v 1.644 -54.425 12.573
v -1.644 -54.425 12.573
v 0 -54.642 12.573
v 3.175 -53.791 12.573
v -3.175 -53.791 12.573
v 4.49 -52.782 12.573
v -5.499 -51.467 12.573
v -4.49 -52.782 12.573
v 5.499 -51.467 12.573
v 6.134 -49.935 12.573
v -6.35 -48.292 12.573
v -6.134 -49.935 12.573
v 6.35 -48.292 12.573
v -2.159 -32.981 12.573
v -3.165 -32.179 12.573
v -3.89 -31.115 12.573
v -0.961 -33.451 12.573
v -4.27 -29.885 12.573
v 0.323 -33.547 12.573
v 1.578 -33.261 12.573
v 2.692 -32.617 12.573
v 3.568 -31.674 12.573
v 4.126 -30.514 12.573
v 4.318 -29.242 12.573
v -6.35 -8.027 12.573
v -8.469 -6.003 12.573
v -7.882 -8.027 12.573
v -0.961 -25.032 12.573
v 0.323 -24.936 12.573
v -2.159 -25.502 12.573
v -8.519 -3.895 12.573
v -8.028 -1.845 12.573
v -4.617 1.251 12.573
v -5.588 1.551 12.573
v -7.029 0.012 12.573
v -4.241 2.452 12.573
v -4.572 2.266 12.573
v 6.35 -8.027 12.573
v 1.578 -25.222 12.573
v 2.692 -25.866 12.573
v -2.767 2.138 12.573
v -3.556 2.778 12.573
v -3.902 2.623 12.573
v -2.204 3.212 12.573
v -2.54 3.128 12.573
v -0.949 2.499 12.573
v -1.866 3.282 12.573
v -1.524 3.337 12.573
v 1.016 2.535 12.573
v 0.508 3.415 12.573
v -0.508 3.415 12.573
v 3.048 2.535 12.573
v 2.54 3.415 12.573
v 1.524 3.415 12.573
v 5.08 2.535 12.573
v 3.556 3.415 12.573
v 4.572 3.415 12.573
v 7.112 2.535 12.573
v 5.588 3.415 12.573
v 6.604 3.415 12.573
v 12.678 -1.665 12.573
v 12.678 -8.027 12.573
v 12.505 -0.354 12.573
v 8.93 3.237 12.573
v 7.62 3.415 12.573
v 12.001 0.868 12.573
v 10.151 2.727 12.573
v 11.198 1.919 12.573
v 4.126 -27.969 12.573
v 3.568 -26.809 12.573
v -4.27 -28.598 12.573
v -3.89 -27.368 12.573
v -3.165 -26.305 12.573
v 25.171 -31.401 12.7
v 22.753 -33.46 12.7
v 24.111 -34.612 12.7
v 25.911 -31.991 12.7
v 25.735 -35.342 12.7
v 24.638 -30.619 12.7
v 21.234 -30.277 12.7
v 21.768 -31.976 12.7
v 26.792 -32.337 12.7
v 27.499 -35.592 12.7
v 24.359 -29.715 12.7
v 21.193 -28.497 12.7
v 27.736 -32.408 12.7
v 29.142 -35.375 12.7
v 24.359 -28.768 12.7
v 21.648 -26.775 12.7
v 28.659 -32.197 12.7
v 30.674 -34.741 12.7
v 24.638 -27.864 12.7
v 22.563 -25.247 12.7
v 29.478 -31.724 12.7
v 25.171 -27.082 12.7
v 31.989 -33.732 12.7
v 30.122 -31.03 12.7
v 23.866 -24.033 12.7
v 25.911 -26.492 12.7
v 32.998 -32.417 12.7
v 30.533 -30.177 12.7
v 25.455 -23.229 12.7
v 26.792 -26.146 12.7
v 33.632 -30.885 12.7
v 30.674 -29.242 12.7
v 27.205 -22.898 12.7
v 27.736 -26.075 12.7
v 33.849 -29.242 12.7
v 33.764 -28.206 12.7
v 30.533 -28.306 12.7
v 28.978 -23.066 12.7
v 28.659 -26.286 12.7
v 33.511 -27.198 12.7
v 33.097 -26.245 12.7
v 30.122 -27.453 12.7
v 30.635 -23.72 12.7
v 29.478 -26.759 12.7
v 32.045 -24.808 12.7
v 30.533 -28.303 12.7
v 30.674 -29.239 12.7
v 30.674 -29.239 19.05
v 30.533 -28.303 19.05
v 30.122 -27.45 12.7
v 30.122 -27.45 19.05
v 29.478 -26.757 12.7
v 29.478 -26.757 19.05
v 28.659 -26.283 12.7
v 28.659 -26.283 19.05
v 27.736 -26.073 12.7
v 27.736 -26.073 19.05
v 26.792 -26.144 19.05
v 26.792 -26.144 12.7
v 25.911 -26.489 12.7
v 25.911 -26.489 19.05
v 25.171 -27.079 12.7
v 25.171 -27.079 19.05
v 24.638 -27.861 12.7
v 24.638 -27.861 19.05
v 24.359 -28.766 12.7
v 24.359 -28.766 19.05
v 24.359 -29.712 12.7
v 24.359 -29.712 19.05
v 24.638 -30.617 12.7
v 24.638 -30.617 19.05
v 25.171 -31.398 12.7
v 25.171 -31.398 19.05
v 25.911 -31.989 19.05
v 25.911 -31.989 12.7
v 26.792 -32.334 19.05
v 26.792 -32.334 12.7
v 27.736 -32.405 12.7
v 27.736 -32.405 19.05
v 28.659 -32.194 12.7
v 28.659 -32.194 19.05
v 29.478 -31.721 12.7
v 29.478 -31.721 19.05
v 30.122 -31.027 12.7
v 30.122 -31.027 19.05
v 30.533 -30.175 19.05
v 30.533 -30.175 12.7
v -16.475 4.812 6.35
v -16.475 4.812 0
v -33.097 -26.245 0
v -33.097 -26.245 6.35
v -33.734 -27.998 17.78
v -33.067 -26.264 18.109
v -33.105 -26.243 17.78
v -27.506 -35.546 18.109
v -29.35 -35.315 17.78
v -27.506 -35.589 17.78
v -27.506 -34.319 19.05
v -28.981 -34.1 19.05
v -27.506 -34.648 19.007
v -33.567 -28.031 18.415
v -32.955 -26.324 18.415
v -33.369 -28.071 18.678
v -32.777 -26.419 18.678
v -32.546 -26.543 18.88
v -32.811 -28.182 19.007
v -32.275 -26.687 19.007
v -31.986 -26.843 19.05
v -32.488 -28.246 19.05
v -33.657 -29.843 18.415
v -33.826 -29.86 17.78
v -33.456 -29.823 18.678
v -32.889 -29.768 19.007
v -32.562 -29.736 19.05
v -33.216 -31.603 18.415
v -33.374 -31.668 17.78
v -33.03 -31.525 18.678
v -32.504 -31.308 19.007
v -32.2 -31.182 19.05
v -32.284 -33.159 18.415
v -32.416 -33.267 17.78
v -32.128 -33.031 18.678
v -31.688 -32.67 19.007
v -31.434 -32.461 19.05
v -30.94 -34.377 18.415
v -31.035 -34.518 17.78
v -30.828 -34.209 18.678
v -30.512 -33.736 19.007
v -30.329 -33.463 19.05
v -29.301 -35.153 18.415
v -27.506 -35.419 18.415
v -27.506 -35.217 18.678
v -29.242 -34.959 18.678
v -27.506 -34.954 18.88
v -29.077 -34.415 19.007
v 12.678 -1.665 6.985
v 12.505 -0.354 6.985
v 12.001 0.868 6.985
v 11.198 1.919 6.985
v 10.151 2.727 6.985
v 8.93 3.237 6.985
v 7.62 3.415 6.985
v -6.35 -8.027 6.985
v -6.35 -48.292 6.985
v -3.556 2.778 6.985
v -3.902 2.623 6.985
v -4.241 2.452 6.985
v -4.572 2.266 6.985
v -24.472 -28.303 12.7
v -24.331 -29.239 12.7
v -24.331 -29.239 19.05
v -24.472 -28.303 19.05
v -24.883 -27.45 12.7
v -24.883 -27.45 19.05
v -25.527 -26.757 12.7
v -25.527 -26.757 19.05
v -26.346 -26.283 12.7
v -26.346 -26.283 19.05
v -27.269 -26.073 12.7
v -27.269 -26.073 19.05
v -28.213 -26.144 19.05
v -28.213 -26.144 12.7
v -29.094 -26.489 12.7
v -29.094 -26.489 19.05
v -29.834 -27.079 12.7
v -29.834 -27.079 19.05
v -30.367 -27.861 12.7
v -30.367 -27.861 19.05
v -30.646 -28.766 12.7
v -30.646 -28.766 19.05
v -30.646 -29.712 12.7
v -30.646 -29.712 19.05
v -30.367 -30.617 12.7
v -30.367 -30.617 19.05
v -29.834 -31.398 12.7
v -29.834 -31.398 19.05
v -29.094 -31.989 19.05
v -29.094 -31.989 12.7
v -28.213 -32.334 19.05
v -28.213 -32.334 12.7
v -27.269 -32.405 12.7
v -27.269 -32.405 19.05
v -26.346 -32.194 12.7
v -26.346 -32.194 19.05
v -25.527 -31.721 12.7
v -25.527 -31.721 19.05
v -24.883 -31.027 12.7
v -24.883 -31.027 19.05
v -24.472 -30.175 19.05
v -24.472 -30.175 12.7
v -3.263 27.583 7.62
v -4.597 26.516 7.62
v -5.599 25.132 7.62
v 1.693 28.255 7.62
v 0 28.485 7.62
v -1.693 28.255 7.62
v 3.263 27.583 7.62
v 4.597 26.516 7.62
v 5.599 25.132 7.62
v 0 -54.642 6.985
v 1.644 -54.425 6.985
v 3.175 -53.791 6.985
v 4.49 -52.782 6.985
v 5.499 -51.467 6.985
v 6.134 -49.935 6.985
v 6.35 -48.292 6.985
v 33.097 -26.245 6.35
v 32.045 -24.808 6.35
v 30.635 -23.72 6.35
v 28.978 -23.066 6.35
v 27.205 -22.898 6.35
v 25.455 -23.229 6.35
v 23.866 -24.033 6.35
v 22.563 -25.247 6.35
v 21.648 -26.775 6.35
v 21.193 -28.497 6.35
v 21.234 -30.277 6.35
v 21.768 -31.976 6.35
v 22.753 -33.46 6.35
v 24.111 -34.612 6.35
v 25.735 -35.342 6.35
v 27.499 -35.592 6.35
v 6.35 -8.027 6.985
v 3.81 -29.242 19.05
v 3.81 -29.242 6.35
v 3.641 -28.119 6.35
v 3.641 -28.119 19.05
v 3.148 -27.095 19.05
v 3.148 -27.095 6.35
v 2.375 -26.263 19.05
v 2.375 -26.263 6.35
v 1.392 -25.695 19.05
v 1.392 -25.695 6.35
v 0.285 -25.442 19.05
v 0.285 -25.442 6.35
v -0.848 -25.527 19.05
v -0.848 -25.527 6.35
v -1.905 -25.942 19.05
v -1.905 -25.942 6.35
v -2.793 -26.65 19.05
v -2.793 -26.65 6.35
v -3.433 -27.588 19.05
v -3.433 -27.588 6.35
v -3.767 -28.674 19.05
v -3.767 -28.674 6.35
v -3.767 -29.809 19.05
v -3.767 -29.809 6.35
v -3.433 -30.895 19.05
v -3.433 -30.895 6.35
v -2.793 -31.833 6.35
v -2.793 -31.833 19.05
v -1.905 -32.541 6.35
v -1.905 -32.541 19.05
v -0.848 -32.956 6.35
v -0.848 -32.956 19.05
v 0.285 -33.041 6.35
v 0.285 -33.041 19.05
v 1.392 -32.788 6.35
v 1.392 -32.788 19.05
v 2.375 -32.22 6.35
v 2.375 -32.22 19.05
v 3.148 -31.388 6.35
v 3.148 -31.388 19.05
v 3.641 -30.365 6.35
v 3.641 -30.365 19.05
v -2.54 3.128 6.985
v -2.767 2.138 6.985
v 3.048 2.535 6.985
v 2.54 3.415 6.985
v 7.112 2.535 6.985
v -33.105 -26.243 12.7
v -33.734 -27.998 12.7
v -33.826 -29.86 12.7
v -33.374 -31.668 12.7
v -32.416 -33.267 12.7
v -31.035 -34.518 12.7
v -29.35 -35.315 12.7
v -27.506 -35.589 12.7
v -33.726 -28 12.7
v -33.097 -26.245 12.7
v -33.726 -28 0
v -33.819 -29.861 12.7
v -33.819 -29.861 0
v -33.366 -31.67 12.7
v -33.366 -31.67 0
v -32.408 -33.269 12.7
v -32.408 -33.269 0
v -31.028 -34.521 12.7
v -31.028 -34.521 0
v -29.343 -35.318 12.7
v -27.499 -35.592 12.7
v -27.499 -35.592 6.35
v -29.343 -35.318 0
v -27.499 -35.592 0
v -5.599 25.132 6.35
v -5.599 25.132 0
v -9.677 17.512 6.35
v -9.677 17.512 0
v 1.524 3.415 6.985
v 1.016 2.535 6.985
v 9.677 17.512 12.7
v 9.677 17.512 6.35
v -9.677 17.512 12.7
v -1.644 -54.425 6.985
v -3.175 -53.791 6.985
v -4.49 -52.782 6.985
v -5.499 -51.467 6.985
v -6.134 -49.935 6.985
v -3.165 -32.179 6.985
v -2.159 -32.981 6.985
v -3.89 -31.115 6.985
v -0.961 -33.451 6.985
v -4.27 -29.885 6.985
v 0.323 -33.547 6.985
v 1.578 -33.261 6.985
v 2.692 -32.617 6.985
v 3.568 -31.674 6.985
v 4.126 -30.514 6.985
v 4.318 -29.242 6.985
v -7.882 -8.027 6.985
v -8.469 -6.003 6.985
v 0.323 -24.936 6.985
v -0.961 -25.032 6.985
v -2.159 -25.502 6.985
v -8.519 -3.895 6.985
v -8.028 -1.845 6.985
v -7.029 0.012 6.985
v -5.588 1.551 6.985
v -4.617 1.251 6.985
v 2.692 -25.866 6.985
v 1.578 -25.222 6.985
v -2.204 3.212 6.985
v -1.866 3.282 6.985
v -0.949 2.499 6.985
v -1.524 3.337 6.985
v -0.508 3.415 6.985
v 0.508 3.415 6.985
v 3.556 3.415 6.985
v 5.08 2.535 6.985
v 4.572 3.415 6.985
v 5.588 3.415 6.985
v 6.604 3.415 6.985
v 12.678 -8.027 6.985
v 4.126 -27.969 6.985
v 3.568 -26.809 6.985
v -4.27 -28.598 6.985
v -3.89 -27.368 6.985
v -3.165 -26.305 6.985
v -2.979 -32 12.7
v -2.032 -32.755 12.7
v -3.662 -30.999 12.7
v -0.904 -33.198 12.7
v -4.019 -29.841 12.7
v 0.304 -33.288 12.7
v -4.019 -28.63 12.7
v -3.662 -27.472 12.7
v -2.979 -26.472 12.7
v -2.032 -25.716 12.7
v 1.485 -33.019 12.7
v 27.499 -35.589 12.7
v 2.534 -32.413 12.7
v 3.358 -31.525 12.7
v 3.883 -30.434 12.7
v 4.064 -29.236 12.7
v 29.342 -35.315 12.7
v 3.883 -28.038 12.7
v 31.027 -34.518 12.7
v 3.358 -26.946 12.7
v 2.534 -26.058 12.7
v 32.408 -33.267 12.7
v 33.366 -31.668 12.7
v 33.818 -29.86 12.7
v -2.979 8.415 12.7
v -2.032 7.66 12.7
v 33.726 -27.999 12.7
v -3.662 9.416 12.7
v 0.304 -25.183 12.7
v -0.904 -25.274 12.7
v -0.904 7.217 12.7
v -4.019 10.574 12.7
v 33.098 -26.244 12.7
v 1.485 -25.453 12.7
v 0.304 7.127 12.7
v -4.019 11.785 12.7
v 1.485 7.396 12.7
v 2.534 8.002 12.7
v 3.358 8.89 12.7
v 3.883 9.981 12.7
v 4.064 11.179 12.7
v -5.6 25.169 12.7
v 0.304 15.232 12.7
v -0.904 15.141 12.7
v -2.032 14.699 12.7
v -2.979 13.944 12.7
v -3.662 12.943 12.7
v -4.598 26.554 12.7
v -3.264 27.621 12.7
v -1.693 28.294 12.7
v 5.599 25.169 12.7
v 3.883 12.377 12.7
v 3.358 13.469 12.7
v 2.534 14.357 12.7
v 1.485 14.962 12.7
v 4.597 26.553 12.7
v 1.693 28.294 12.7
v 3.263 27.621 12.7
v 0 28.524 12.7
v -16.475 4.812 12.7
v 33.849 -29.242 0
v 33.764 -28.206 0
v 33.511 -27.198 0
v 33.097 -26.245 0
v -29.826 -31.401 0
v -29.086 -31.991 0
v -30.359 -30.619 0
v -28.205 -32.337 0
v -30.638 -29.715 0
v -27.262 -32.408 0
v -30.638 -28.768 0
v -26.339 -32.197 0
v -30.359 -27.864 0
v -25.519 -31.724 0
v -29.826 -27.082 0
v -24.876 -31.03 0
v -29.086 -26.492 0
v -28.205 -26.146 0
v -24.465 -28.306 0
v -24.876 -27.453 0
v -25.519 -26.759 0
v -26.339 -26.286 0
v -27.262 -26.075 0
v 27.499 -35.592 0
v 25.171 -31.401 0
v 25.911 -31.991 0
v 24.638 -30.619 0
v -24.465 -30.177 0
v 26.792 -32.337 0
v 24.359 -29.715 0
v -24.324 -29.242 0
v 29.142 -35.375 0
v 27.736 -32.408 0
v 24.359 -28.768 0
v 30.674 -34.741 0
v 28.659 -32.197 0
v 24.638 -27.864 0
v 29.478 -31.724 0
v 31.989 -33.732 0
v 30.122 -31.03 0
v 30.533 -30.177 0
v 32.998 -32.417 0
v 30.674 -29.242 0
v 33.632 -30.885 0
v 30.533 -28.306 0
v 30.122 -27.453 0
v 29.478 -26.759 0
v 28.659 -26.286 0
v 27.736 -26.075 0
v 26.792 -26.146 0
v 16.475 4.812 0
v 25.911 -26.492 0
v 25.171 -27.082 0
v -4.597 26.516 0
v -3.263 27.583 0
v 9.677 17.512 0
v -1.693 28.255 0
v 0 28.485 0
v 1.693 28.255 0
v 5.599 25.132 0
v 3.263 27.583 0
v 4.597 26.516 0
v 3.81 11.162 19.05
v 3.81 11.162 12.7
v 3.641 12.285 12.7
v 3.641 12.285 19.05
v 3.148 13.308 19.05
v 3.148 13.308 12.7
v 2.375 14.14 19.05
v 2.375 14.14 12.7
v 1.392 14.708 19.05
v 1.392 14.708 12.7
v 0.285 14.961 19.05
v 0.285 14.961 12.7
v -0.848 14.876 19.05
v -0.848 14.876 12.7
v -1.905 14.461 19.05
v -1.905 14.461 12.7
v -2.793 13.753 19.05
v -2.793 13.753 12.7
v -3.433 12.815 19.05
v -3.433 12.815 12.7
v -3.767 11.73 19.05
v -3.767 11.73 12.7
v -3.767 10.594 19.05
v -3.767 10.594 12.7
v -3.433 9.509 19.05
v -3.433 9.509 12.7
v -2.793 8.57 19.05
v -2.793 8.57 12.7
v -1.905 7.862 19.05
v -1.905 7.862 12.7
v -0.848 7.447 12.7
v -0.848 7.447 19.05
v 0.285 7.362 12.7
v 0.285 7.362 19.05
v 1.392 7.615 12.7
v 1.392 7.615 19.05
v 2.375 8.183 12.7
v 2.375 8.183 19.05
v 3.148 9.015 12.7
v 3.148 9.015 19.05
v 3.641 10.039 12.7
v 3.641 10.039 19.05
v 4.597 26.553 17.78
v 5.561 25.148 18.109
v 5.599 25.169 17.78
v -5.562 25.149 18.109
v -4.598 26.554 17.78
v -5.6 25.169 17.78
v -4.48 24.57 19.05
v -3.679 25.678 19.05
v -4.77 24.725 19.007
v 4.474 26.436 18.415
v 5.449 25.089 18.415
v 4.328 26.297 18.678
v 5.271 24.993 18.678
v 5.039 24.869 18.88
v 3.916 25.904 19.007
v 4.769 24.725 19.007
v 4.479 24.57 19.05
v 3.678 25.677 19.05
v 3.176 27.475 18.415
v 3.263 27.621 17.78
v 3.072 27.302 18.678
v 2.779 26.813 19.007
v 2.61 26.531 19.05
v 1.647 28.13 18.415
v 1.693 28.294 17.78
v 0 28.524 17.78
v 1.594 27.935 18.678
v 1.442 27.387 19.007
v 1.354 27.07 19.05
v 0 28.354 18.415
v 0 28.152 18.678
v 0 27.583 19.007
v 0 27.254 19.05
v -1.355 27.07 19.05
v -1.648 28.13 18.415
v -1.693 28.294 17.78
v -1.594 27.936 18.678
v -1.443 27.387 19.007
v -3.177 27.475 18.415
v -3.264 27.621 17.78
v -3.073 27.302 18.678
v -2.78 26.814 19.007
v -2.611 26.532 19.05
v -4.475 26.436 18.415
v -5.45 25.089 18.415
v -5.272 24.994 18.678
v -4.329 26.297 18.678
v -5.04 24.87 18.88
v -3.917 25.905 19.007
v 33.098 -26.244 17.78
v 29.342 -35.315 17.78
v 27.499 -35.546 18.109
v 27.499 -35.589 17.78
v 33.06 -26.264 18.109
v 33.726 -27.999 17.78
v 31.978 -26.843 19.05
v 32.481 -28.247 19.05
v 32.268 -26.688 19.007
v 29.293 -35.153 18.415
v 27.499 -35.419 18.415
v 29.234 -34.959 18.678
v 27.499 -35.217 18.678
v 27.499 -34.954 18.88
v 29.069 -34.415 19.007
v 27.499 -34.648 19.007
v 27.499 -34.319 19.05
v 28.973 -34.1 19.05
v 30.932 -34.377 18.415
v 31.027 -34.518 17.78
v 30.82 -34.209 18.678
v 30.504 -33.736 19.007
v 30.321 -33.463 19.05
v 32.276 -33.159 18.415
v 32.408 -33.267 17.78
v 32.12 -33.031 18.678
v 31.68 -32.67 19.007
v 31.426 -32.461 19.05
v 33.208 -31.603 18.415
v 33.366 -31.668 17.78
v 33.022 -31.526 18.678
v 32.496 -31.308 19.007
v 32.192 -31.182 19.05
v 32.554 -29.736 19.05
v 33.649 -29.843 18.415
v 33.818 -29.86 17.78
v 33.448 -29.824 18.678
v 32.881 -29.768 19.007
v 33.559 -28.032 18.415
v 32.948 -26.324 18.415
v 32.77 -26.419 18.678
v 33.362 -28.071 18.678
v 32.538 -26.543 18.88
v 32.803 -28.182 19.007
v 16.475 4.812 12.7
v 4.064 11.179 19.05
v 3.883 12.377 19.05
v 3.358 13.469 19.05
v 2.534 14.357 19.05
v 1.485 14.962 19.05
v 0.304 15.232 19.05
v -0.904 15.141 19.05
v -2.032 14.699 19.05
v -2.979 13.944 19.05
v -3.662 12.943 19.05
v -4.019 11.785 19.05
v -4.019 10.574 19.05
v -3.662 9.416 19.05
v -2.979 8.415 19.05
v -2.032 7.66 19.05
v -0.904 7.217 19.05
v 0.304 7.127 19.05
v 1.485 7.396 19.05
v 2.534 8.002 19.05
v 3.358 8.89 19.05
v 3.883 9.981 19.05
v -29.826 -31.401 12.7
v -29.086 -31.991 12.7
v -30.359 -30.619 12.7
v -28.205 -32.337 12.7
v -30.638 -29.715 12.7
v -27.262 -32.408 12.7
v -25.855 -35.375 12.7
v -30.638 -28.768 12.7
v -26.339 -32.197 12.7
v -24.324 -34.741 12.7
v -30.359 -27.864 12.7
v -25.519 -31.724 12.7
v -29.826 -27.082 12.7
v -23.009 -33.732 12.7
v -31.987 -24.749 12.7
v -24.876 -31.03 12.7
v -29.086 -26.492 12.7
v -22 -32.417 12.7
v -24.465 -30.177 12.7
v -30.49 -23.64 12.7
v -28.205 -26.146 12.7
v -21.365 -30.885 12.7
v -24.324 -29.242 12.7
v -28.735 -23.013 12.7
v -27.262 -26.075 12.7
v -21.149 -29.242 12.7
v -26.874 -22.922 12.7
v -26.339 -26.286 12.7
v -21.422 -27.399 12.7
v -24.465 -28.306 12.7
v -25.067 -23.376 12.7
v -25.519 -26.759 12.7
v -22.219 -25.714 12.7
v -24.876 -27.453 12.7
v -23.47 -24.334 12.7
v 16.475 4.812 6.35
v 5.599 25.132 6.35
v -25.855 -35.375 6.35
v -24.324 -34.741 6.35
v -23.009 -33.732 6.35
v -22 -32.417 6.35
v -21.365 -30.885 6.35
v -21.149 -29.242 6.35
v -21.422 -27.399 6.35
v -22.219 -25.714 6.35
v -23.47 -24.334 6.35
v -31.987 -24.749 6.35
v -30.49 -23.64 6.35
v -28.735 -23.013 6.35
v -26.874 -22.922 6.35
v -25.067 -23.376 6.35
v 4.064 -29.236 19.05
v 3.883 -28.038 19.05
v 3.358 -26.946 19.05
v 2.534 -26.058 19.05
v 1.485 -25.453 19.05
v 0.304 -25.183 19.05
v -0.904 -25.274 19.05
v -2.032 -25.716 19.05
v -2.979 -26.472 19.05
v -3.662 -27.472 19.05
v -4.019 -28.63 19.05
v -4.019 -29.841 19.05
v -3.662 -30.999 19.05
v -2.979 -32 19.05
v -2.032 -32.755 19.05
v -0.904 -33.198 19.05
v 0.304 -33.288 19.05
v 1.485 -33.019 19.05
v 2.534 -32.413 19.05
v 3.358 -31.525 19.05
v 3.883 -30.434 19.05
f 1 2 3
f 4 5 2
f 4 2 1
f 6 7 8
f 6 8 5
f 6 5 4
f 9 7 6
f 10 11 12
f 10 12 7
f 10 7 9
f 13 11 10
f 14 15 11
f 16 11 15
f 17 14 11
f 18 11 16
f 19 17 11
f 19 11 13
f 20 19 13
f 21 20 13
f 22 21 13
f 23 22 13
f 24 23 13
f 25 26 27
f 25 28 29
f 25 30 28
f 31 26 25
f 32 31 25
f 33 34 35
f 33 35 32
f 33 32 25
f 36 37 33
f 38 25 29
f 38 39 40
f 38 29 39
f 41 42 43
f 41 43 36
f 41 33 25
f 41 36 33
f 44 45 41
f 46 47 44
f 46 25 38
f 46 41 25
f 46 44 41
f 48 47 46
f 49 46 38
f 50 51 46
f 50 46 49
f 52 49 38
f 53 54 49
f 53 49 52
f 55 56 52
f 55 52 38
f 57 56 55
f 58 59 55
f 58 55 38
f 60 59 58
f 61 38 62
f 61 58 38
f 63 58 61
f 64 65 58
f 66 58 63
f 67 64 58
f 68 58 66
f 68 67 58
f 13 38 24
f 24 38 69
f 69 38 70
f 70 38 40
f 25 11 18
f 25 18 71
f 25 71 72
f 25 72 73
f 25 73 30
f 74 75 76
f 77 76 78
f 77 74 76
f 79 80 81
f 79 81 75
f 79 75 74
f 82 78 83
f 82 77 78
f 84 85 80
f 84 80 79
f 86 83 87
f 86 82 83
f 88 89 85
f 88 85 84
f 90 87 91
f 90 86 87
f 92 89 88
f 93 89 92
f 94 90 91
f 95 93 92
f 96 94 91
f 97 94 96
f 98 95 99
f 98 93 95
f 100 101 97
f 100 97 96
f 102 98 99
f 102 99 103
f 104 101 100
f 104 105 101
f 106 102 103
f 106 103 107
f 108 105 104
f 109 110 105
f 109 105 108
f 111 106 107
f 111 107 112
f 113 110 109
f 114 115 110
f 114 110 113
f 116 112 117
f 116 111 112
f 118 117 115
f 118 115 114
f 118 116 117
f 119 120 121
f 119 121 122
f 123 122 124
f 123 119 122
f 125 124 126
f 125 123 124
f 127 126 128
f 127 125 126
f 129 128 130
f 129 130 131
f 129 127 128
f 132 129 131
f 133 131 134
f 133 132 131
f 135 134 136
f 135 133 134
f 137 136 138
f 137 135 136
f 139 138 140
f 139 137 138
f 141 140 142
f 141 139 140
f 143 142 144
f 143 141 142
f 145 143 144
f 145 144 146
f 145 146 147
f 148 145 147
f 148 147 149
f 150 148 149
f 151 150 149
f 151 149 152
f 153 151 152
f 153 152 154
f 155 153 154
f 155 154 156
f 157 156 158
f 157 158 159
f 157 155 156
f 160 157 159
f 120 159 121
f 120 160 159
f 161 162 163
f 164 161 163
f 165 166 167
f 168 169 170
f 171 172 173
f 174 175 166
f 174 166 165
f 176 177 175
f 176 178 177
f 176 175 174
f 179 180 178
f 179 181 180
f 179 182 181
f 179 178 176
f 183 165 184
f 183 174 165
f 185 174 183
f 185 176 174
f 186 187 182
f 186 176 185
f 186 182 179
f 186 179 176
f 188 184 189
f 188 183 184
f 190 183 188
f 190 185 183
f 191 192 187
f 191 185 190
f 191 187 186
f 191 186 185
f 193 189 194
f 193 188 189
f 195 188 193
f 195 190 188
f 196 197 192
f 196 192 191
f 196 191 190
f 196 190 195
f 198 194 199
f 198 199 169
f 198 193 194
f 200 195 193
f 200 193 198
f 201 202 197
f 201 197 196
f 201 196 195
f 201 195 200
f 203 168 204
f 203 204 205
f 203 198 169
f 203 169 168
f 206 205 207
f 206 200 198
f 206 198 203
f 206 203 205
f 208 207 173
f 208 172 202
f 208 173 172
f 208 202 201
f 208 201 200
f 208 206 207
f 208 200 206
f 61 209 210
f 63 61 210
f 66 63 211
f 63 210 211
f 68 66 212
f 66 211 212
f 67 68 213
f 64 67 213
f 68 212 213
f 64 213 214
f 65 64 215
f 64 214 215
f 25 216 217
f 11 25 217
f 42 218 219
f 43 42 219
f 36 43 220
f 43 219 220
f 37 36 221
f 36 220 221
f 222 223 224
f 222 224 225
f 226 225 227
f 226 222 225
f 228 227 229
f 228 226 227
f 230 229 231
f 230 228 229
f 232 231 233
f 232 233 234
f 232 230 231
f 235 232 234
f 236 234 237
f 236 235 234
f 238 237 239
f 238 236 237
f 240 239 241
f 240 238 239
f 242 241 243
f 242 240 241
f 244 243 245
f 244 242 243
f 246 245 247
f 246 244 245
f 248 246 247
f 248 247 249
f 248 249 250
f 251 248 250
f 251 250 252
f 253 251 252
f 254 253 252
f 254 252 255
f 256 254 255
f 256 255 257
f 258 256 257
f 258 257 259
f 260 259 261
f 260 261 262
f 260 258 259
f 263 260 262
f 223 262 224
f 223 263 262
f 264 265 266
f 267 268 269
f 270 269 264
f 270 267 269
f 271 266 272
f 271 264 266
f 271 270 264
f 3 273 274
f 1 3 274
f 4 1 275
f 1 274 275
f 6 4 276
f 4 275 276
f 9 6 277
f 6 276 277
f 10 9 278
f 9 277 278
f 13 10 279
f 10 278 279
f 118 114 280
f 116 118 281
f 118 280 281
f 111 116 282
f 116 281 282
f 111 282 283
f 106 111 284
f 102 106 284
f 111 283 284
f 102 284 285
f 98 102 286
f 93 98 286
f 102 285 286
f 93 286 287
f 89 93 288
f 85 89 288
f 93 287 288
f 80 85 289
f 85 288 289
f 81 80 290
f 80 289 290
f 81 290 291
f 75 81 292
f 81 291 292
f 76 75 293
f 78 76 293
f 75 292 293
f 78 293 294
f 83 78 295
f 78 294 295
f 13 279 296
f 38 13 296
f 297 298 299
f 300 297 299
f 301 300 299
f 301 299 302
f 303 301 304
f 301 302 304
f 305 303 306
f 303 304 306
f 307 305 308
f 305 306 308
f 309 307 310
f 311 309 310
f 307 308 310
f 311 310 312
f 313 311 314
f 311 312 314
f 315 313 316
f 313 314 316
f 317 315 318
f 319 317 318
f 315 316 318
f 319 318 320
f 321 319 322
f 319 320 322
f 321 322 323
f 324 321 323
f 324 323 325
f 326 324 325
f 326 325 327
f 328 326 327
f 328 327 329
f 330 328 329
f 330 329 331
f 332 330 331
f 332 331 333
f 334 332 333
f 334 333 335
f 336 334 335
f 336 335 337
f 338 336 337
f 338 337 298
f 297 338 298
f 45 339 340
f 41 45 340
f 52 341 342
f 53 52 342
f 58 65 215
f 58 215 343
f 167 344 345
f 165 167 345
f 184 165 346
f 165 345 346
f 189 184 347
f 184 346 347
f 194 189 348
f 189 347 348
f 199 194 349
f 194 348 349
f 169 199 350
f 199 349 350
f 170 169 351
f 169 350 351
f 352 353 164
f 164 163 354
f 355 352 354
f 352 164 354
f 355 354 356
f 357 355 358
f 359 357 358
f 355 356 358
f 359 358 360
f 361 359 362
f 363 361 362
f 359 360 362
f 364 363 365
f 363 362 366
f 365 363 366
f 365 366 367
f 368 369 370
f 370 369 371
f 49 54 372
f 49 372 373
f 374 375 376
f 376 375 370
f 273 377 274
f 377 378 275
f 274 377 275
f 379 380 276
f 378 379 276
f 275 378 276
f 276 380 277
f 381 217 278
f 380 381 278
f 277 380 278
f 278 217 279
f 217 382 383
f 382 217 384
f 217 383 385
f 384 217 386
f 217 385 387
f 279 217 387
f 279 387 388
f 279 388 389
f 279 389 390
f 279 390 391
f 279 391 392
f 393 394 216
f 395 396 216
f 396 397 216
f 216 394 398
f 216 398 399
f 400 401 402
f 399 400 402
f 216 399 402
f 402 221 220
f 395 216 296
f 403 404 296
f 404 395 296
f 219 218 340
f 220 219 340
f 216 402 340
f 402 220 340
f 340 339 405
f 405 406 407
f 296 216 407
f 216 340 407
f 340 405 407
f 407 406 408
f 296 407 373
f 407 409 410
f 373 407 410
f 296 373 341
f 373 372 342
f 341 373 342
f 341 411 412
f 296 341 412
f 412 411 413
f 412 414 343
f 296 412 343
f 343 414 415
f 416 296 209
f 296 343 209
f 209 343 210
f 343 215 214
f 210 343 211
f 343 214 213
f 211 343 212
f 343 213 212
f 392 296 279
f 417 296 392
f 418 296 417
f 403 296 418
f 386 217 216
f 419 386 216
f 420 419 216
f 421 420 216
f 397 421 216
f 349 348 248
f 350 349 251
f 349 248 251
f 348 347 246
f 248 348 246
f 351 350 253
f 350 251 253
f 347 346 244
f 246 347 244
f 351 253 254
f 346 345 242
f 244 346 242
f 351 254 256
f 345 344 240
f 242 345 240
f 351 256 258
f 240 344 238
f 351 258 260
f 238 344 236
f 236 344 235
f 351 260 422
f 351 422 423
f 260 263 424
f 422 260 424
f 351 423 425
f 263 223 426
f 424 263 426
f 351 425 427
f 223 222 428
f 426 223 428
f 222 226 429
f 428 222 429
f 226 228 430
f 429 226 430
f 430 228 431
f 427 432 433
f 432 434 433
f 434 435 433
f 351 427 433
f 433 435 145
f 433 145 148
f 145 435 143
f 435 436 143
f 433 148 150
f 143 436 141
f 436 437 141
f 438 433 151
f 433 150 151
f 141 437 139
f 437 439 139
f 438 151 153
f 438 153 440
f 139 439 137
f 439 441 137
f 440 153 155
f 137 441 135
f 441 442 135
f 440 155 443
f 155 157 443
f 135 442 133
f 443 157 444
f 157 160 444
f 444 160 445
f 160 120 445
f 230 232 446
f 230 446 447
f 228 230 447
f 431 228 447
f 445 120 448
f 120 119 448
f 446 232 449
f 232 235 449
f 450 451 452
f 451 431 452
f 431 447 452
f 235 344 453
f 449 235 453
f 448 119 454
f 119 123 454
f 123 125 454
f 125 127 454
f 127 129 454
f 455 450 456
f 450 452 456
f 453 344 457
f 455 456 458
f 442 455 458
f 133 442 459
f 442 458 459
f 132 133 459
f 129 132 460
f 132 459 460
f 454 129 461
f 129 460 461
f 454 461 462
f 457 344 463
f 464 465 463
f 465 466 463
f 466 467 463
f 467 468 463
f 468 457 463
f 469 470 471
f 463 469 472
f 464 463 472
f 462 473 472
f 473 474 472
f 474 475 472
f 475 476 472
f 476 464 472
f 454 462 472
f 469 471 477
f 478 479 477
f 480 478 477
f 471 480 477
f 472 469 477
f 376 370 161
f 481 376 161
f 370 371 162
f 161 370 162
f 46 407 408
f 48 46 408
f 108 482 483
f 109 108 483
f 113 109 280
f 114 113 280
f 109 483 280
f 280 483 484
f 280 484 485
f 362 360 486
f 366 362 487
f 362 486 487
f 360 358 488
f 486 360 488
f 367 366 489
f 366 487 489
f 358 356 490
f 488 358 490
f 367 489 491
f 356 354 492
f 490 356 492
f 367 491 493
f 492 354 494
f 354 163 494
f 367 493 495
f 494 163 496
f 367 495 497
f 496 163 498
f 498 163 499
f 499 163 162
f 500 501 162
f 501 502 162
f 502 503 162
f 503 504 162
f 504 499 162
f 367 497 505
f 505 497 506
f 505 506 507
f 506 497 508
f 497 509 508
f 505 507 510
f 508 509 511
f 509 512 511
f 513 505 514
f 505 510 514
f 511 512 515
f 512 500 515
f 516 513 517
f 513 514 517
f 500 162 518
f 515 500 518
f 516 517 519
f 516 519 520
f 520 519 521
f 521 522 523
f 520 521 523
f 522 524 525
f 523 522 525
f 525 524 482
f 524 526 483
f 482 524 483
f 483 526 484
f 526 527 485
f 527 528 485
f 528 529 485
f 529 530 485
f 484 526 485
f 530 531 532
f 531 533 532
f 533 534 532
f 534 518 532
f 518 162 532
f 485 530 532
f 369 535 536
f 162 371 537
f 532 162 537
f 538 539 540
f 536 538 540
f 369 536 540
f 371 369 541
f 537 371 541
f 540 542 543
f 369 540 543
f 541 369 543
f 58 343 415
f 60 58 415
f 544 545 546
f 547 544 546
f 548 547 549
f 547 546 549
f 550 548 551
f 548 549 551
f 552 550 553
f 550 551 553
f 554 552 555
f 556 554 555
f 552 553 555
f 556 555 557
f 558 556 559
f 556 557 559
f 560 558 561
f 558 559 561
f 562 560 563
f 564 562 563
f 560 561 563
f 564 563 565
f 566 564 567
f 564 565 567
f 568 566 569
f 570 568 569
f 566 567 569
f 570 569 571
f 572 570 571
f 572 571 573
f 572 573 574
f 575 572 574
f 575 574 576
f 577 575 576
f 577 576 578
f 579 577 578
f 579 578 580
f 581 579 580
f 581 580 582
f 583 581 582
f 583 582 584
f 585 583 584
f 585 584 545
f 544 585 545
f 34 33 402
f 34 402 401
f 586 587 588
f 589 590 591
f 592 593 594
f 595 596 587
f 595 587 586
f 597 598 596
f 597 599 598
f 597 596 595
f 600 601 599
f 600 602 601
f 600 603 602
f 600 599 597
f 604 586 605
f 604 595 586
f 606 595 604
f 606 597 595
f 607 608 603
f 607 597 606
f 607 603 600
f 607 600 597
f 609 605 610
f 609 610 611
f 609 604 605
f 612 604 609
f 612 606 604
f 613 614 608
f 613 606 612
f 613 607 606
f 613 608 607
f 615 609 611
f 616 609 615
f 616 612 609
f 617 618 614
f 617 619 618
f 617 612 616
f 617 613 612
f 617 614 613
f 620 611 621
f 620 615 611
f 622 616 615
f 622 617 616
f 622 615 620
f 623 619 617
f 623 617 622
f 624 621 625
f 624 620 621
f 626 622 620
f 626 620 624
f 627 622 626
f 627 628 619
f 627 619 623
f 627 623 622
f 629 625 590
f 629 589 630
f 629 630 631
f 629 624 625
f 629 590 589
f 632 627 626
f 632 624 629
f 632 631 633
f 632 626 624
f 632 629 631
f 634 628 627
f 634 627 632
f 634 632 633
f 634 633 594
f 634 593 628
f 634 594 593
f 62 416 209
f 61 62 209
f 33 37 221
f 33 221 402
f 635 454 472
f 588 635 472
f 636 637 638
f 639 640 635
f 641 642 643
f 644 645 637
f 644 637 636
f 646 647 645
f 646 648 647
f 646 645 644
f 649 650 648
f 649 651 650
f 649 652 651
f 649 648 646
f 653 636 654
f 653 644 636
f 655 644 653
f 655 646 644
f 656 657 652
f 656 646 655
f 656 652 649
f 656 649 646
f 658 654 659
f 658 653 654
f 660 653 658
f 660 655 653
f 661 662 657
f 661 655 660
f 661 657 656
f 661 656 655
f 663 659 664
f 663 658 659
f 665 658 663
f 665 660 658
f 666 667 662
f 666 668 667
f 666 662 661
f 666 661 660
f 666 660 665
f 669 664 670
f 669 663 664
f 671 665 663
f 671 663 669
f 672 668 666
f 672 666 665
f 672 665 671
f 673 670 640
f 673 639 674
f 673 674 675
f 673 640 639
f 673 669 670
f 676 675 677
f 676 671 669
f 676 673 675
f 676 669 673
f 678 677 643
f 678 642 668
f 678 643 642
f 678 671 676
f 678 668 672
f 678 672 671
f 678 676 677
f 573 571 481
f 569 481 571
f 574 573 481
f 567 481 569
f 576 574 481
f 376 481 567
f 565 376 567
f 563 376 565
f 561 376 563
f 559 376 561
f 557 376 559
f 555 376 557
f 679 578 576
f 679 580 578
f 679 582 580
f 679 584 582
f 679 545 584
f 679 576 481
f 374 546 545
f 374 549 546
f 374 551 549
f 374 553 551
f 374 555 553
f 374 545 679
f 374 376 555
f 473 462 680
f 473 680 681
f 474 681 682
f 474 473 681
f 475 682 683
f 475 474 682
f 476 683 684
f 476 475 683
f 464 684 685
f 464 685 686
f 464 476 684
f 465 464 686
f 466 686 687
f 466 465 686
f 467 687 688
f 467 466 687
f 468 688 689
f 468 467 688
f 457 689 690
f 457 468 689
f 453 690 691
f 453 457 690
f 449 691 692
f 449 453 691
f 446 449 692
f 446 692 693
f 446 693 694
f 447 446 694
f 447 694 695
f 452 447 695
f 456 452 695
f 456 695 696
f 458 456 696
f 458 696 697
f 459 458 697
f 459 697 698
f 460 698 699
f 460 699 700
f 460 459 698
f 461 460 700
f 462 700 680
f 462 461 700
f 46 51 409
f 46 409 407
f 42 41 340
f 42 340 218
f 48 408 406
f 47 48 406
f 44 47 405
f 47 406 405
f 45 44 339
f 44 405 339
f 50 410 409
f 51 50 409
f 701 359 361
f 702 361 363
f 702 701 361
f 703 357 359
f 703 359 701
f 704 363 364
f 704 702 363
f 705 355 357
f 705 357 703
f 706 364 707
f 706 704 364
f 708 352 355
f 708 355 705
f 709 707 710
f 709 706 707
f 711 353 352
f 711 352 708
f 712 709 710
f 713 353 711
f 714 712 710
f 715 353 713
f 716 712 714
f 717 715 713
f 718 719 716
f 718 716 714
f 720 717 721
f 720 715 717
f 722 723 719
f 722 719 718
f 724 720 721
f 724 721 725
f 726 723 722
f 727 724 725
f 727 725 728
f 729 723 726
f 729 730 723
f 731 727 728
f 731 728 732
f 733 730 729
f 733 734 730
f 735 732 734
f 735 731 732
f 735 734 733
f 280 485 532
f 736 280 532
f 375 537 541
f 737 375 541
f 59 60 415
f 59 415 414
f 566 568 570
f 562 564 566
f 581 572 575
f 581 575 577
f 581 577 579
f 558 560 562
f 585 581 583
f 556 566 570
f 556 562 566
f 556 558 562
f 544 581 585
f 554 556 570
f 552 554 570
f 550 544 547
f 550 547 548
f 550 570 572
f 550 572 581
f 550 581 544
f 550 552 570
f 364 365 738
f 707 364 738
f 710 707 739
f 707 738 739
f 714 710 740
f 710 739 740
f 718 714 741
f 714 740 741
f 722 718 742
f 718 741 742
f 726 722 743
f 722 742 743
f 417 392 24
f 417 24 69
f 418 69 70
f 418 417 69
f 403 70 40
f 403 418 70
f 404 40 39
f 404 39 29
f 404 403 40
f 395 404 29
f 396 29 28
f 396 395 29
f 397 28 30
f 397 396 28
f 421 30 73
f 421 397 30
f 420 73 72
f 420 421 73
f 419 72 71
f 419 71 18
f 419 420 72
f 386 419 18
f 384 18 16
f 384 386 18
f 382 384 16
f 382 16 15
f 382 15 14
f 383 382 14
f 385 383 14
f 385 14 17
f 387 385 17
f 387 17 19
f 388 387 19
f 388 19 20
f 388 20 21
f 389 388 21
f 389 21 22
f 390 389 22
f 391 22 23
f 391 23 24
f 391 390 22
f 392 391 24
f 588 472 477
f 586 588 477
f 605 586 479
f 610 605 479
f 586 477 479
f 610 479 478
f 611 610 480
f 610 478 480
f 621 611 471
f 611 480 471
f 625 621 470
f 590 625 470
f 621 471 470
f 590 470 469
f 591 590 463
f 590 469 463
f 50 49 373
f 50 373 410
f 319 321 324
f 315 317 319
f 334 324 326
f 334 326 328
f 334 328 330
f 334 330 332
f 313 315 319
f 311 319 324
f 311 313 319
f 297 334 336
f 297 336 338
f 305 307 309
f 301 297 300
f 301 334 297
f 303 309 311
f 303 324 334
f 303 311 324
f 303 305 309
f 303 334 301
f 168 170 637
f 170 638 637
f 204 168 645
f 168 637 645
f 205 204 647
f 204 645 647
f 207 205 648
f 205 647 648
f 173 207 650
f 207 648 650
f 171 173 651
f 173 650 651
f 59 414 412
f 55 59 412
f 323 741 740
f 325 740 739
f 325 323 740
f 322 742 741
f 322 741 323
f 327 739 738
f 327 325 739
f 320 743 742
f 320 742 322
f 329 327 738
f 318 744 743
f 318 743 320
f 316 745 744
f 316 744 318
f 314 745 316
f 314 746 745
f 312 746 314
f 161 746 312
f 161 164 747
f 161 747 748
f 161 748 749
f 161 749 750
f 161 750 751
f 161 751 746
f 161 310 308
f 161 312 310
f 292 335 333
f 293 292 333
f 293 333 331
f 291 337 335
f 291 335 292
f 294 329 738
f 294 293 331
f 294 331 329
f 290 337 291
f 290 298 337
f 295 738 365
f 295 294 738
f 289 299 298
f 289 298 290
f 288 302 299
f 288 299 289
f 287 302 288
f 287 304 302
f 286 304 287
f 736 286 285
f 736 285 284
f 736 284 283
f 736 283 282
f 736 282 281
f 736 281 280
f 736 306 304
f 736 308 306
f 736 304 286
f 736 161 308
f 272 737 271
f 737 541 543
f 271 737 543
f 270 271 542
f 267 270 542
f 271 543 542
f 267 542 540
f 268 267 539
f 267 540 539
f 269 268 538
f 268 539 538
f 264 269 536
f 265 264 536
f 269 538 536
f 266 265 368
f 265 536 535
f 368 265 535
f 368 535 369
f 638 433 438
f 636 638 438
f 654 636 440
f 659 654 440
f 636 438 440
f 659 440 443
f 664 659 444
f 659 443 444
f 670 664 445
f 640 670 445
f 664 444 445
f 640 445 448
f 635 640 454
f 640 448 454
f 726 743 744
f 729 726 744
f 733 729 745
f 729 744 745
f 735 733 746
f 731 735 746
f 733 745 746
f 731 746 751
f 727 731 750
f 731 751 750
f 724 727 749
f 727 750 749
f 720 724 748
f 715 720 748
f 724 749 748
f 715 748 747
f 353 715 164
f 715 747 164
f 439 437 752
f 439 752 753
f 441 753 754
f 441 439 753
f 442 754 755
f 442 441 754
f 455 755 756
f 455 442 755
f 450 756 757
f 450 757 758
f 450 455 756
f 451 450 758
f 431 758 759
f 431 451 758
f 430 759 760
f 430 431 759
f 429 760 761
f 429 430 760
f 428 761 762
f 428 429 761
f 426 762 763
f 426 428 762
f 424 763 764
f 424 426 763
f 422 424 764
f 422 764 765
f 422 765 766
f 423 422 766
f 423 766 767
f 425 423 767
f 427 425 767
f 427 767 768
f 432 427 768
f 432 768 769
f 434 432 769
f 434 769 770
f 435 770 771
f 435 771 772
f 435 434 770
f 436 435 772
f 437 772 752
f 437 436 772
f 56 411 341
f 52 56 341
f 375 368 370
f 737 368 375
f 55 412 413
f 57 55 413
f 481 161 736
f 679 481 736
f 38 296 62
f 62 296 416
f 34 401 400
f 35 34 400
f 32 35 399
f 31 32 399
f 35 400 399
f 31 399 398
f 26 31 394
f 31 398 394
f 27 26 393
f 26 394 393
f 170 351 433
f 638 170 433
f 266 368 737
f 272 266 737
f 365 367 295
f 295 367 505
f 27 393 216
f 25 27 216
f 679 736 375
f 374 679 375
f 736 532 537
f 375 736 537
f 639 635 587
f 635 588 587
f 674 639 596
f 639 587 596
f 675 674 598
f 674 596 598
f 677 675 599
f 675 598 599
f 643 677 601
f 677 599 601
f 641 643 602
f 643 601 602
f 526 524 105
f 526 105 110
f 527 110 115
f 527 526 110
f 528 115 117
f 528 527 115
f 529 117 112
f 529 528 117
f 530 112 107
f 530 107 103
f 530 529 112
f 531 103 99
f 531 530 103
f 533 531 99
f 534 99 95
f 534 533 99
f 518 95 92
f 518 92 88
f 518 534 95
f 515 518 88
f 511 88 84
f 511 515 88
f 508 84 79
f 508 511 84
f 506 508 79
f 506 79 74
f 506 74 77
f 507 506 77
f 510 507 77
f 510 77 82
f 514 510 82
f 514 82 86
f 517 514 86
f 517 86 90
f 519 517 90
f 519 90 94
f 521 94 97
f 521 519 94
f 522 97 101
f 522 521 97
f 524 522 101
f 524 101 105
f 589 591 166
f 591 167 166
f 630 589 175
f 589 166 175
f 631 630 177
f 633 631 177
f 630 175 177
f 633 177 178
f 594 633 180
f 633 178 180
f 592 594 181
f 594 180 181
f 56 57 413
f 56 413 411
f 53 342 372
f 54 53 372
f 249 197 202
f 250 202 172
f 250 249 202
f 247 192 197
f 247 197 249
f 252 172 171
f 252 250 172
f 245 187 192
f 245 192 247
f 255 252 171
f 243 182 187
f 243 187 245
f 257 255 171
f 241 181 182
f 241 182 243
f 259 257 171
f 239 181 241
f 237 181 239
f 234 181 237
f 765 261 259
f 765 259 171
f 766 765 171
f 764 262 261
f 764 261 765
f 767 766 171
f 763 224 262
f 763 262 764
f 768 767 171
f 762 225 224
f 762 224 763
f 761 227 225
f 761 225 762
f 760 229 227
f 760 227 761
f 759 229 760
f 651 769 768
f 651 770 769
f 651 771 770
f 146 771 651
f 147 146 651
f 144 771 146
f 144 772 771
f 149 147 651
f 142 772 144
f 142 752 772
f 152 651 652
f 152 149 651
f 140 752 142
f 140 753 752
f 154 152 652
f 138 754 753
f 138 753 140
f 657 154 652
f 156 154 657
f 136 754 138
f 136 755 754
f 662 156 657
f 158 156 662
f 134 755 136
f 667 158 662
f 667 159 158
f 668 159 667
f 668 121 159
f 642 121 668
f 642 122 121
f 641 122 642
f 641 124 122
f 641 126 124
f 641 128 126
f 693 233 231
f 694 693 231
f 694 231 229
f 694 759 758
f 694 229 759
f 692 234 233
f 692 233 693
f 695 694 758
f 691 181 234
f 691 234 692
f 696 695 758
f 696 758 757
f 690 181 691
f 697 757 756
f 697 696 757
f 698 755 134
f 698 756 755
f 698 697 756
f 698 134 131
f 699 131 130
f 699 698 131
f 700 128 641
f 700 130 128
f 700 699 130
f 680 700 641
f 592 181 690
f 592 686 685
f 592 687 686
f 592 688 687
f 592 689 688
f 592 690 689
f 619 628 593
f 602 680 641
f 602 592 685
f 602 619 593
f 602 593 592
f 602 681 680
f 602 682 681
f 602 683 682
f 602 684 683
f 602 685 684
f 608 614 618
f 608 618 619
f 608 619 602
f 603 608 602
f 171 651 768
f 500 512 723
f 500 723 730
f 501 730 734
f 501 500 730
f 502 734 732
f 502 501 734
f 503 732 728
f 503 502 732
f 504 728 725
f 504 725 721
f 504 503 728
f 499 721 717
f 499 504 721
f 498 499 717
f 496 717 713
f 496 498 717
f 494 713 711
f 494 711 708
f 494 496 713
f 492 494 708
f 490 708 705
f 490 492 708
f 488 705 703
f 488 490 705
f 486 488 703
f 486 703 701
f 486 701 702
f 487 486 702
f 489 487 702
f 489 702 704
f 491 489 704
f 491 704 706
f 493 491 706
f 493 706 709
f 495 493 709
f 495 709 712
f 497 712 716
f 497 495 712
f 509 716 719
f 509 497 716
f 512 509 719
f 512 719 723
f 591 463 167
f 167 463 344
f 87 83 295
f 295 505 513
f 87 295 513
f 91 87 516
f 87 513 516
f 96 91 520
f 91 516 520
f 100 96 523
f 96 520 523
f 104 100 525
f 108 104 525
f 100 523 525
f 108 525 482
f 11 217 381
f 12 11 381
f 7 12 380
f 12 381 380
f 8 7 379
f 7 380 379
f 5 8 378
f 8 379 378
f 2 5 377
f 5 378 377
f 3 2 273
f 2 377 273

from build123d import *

# Parameters (mm, degrees)
F0_R      = 3.81
F1_DEPTH  = 6.35
F0_R_2    = 3.175
F2_DEPTH  = 12.7
F3_DEPTH  = 19.05
F4_DEPTH  = 7.62
F7_START  = 6.35
F6_R      = 3.175
F6_R_2    = 4.064
F7_DEPTH  = 6.35
F8_R      = 1.27
F10_START = 0.635
F9_R      = 4.318
F10_DEPTH = 5.588


# Not quite as in the source:
# - a feature names something its author has since deleted; it is built from what else it names


with BuildPart() as f1:
    # F0 (on Top) → F1 (new body)
    with BuildSketch(Plane.XY):
        with BuildLine():
            Line((-27.4988556353, -35.5915231094), (27.4988556353, -35.5915231094))
            ThreePointArc((27.4988556353, -35.5915231094), (22.0513543675, -25.9785137718), (33.0973587859, -26.2449813572))
            Line((33.0973587859, -26.2449813572), (16.4745760518, 4.811719736))
            Line((16.4745760518, 4.811719736), (-16.4745760518, 4.811719736))
            Line((-16.4745760518, 4.811719736), (-33.0973587859, -26.2449813572))
            ThreePointArc((-33.0973587859, -26.2449813572), (-25.954186578, -23.0822619927), (-21.1488556353, -29.2415231094))
            ThreePointArc((-21.1488556353, -29.2415231094), (-23.0087275748, -33.7316511699), (-27.4988556353, -35.5915231094))
        make_face()
        with Locations((0, -29.2415231094)):
            Circle(F0_R, mode=Mode.SUBTRACT)
    extrude(amount=F1_DEPTH)



with BuildPart() as f1b:
    # F0 (on Top) → F1, piece 2 (new body)
    with BuildSketch(Plane.XY):
        Polygon((-9.6770304886, 17.511719736), (9.6770304886, 17.511719736), (5.5985031506, 25.131719736), (-5.5985031506, 25.131719736), align=None)
    extrude(amount=F1_DEPTH)


with BuildPart() as f1_1:
    add(f1.part)

    add(f1b.part)  # F2 merges F1b
    # F0 (on Top) → F2 (join)
    with BuildSketch(Plane.XY):
        Polygon((-16.4745760518, 4.811719736), (16.4745760518, 4.811719736), (9.6770304886, 17.511719736), (-9.6770304886, 17.511719736), align=None)
        with Locations((0, 11.161719736)):
            Circle(F0_R, mode=Mode.SUBTRACT)
        with BuildLine():
            ThreePointArc((-33.0973587859, -26.2449813572), (-32.9463569031, -32.5045324469), (-27.4988556353, -35.5915231094))
            ThreePointArc((-27.4988556353, -35.5915231094), (-23.0087275748, -33.7316511699), (-21.1488556353, -29.2415231094))
            ThreePointArc((-21.1488556353, -29.2415231094), (-25.954186578, -23.0822619927), (-33.0973587859, -26.2449813572))
        make_face()
        with Locations((-27.4988556353, -29.2415231094)):
            Circle(F0_R_2, mode=Mode.SUBTRACT)
        with BuildLine():
            ThreePointArc((33.0973587859, -26.2449813572), (22.0513543675, -25.9785137718), (27.4988556353, -35.5915231094))
            ThreePointArc((27.4988556353, -35.5915231094), (31.9889836958, -33.7316511699), (33.8488556353, -29.2415231094))
            ThreePointArc((33.8488556353, -29.2415231094), (33.658116752, -27.696854052), (33.0973587859, -26.2449813572))
        make_face()
        with Locations((27.4988556353, -29.2415231094)):
            Circle(F0_R_2, mode=Mode.SUBTRACT)
    extrude(amount=F2_DEPTH)

    # F0 (on Top) → F3 (join)
    with BuildSketch(Plane.XY):
        with Locations((0, -29.2415231094)):
            Circle(F0_R)
        with Locations((0, 11.161719736)):
            Circle(F0_R)
    extrude(amount=F3_DEPTH)

    # F0 (on Top) → F4 (join)
    with BuildSketch(Plane.XY):
        with BuildLine():
            Line((-5.5985031506, 25.131719736), (5.5985031506, 25.131719736))
            ThreePointArc((5.5985031506, 25.131719736), (0, 28.4851779838), (-5.5985031506, 25.131719736))
        make_face()
    extrude(amount=F4_DEPTH)


with BuildPart() as f7:
    # F6 (on offset) → F7 (new body)
    with BuildSketch(Plane.XY.offset(6.35).offset(F7_START)):
        with BuildLine():
            ThreePointArc((-33.1054605215, -26.2434523784), (-32.9535893922, -32.5024634142), (-27.5063946063, -35.5889424682))
            Line((-27.5063946063, -35.5889424682), (27.4986321348, -35.5889424682))
            ThreePointArc((27.4986321348, -35.5889424682), (32.9456677616, -32.5027290543), (33.0979901862, -26.2439984934))
            Line((33.0979901862, -26.2439984934), (5.5987015339, 25.1687706999))
            ThreePointArc((5.5987015339, 25.1687706999), (-0.0003468463, 28.5238267175), (-5.5997224327, 25.1693168148))
            Line((-5.5997224327, 25.1693168148), (-33.1054605215, -26.2434523784))
        make_face()
        with Locations((-27.5063946063, -29.2389424682)):
            Circle(F6_R, mode=Mode.SUBTRACT)
        with Locations((0, -29.2357727885)):
            Circle(F6_R_2, mode=Mode.SUBTRACT)
        with Locations((27.4986321348, -29.2389424682)):
            Circle(F6_R, mode=Mode.SUBTRACT)
        with Locations((0, 11.1793484539)):
            Circle(F6_R_2, mode=Mode.SUBTRACT)
    extrude(amount=F7_DEPTH)

    # F8
    f8_edges = [f7.edges().sort_by_distance(p)[0] for p in [
        (-0.003881, -35.588942, 19.05),
        (-19.352591, -0.537068, 19.05),
        (-32.953589, -32.502463, 19.05),
        (32.945668, -32.502729, 19.05),
        (19.348346, -0.537614, 19.05),
        (-0.000347, 28.523827, 19.05),
    ]]
    fillet(f8_edges, radius=F8_R)


with BuildPart() as f10:
    # F9 (on offset) → F10 (new body)
    with BuildSketch(Plane.XY.offset(6.35).offset(F10_START)):
        with BuildLine():
            Line((6.35, -8.0273897686), (-6.35, -8.0273897686))
            Line((-6.35, -8.0273897686), (-6.35, -48.2915231094))
            ThreePointArc((-6.35, -48.2915231094), (-4.4901280605, -52.7816511699), (0, -54.6415231094))
            ThreePointArc((0, -54.6415231094), (4.4901280605, -52.7816511699), (6.35, -48.2915231094))
            Line((6.35, -48.2915231094), (6.35, -8.0273897686))
        make_face()
        with Locations((0, -29.2415231094)):
            Circle(F9_R, mode=Mode.SUBTRACT)
        with BuildLine():
            ThreePointArc((-5.588, 1.5509696046), (-8.3397511172, -2.853894355), (-7.8815962098, -8.0273897686))
            Line((-7.8815962098, -8.0273897686), (-6.35, -8.0273897686))
            Line((-6.35, -8.0273897686), (6.35, -8.0273897686))
            Line((6.35, -8.0273897686), (7.1399843125, -8.0273897686))
            Line((7.1399843125, -8.0273897686), (12.6776003079, -8.0273897686))
            Line((12.6776003079, -8.0273897686), (12.6776003079, -1.665280264))
            ThreePointArc((12.6776003079, -1.665280264), (11.1976135326, 1.918893948), (7.62, 3.4146703512))
            Line((7.62, 3.4146703512), (7.1119572316, 2.5348132347))
            Line((7.1119572316, 2.5348132347), (6.604, 3.414719736))
            Line((6.604, 3.414719736), (5.588, 3.414719736))
            Line((5.588, 3.414719736), (5.08, 2.5348379257))
            Line((5.08, 2.5348379257), (4.572, 3.414719736))
            Line((4.572, 3.414719736), (3.556, 3.414719736))
            Line((3.556, 3.414719736), (3.048, 2.5348379257))
            Line((3.048, 2.5348379257), (2.54, 3.414719736))
            Line((2.54, 3.414719736), (1.524, 3.414719736))
            Line((1.524, 3.414719736), (1.016, 2.5348379257))
            Line((1.016, 2.5348379257), (0.508, 3.414719736))
            Line((0.508, 3.414719736), (0, 3.414719736))
            Line((0, 3.414719736), (-0.508, 3.414719736))
            Line((-0.508, 3.414719736), (-0.9487344679, 2.4992913505))
            Line((-0.9487344679, 2.4992913505), (-1.524, 3.3367431805))
            ThreePointArc((-1.524, 3.3367431805), (-2.0353121388, 3.248589027), (-2.54, 3.1281671814))
            Line((-2.54, 3.1281671814), (-2.7671357963, 2.1378817023))
            Line((-2.7671357963, 2.1378817023), (-3.556, 2.7781545099))
            ThreePointArc((-3.556, 2.7781545099), (-4.0729321621, 2.5395770195), (-4.572, 2.2655891141))
            Line((-4.572, 2.2655891141), (-4.617414163, 1.250604605))
            Line((-4.617414163, 1.250604605), (-5.588, 1.5509696046))
        make_face()
    extrude(amount=F10_DEPTH)


solid = Compound([f1_1.part, f7.part, f10.part])
